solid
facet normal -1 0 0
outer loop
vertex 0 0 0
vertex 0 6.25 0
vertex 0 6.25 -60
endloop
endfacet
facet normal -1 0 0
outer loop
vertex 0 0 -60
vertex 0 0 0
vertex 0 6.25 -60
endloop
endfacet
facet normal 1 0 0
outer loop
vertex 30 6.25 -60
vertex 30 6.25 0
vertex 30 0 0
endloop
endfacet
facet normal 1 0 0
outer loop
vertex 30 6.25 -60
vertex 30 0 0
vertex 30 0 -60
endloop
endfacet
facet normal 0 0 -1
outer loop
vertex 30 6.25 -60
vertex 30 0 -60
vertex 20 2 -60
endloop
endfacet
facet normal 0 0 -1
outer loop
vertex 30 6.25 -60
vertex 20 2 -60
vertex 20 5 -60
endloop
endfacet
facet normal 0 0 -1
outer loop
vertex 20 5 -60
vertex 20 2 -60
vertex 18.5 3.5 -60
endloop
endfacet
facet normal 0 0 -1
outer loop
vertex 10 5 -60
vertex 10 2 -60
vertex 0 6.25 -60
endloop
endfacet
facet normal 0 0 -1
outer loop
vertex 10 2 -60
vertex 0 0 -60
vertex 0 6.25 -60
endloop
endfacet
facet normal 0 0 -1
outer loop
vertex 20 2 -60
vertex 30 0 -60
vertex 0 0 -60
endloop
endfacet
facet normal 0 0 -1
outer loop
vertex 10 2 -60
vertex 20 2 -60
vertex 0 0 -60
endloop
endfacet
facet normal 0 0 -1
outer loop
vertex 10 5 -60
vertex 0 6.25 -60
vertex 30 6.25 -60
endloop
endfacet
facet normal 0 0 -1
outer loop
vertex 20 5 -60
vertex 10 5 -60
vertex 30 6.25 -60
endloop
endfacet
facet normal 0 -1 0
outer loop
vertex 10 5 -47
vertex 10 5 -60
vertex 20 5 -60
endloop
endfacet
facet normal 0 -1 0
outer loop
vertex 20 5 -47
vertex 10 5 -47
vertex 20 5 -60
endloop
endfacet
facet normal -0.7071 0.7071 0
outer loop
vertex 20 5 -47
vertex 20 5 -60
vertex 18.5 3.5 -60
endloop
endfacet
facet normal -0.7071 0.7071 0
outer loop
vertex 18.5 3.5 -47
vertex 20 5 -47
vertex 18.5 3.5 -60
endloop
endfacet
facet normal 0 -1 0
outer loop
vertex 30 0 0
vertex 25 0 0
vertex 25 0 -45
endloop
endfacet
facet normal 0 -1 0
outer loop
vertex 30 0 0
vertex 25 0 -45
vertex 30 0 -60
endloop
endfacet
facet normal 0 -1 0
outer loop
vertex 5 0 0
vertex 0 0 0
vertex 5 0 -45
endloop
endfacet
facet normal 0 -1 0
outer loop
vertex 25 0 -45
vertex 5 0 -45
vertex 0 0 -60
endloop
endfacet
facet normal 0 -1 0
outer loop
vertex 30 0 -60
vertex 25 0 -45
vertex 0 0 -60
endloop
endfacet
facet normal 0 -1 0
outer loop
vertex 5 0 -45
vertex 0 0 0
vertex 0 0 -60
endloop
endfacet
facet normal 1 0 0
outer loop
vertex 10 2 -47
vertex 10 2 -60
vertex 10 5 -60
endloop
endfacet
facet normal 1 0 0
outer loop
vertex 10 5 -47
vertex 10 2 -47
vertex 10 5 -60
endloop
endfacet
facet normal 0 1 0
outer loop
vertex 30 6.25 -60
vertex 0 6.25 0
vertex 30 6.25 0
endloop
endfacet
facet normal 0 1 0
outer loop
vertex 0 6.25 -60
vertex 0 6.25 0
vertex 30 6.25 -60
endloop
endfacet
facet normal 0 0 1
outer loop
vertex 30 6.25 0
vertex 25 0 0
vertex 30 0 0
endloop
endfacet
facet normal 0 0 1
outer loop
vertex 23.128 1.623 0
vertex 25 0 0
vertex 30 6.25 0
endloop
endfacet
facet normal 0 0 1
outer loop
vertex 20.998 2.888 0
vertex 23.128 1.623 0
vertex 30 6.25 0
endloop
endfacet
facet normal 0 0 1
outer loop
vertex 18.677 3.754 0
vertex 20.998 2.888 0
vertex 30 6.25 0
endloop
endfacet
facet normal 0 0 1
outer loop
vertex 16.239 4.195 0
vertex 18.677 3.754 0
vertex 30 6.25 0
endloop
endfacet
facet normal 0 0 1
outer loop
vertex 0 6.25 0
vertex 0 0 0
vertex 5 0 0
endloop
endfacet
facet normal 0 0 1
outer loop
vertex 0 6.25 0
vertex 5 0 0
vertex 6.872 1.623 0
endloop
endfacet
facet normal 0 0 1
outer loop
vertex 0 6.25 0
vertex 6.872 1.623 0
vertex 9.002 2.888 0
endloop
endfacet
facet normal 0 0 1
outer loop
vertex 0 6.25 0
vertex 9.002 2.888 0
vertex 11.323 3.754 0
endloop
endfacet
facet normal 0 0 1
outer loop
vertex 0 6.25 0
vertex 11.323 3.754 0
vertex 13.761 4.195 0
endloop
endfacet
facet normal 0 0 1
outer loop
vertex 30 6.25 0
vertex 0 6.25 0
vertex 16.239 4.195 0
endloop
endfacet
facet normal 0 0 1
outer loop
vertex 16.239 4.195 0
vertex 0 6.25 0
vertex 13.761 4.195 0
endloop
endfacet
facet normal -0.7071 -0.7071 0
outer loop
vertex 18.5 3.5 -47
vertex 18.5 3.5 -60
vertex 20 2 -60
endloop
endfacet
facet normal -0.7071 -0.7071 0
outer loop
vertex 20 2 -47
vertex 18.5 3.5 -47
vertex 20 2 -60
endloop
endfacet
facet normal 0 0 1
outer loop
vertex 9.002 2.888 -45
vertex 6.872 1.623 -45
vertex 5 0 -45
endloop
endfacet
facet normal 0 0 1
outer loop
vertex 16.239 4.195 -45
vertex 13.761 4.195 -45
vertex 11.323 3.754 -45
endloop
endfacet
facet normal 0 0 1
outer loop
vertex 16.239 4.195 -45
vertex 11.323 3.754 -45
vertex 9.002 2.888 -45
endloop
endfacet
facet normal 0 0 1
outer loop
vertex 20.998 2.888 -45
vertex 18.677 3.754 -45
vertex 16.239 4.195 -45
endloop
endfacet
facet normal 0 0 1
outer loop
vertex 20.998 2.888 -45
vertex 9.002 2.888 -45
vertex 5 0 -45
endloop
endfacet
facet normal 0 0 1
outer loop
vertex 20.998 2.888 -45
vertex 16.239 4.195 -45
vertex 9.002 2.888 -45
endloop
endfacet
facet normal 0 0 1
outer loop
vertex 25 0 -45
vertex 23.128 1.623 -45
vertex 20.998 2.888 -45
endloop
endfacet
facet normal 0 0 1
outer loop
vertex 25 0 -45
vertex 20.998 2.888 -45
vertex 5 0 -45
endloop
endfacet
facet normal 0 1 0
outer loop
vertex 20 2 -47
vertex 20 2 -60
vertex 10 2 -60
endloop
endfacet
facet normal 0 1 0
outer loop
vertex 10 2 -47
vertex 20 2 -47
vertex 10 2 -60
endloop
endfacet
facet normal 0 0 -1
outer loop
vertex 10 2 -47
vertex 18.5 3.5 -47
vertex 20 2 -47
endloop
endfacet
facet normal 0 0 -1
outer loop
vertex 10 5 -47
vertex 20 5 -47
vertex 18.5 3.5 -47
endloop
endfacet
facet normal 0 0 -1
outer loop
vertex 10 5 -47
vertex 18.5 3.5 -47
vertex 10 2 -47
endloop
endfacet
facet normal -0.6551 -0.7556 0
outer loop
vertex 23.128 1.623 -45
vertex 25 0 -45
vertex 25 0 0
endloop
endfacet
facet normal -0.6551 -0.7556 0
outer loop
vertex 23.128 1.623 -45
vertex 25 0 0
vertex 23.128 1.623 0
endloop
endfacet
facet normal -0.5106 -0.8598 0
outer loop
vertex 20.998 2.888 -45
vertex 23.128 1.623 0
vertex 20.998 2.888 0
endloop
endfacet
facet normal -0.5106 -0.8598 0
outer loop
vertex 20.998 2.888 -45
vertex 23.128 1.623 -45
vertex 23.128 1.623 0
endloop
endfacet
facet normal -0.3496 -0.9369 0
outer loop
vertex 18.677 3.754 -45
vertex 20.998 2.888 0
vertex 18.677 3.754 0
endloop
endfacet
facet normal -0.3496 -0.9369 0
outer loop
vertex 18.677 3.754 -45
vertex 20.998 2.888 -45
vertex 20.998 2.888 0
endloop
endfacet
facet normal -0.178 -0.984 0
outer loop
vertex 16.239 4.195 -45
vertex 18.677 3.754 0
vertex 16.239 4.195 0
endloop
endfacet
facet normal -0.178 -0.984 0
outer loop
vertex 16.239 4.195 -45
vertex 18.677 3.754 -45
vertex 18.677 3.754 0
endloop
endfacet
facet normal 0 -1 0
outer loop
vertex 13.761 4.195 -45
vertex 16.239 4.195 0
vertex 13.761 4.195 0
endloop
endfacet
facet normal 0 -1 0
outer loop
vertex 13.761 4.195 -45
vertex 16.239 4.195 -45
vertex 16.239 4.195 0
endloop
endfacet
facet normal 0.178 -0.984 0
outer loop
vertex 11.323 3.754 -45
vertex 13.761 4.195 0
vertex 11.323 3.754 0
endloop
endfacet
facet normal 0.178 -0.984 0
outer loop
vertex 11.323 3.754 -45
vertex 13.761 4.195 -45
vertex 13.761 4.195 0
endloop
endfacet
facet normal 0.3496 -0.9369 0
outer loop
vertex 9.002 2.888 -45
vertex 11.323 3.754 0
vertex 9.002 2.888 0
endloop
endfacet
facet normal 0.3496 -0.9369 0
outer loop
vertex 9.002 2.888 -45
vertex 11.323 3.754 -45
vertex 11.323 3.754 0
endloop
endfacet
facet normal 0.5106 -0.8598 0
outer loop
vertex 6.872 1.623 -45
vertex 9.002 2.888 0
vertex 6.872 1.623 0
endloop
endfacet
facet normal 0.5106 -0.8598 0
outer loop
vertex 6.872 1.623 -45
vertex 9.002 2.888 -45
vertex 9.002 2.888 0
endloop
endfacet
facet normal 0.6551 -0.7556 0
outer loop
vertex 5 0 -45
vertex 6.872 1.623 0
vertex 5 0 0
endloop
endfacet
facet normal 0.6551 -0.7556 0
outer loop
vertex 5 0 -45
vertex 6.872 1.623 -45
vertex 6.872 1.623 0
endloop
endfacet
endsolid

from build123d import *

# Parameters (mm, degrees)
SKETCH1_W               = 60
SKETCH1_H               = 6.25
BOSS_EXTRUDE1_DEPTH     = 30
CUT_EXTRUDE1_DEPTH      = 68.372564891
CUT_EXTRUDE1_DEPTH_BACK = 45
CUT_EXTRUDE2_DEPTH      = 13


with BuildPart() as part:
    # Sketch1 → Boss-Extrude1 (new body)
    with BuildSketch(Plane(origin=(0, 0, 0), x_dir=(0, 0, -1), z_dir=(1, 0, 0))):
        with Locations((30, 3.125)):
            Rectangle(SKETCH1_W, SKETCH1_H)
    extrude(amount=BOSS_EXTRUDE1_DEPTH)

    # Sketch2 → Cut-Extrude1 (cut, two sides: drawn at the far end of the back side and taken through both)
    with BuildSketch(Plane.XY.offset(-CUT_EXTRUDE1_DEPTH_BACK)):
        with BuildLine():
            Line((5, 0), (25, 0))
            ThreePointArc((25, 0), (15, 4.25), (5, 0))
        make_face()
    extrude(amount=CUT_EXTRUDE1_DEPTH + CUT_EXTRUDE1_DEPTH_BACK, mode=Mode.SUBTRACT)

    # Sketch3 → Cut-Extrude2 (cut)
    with BuildSketch(Plane(origin=(0, 0, -60), x_dir=(-1, 0, 0), z_dir=(0, 0, -1))):
        Polygon((-10, 2), (-10, 5), (-20, 5), (-18.5, 3.5), (-20, 2), align=None)
    extrude(amount=-CUT_EXTRUDE2_DEPTH, mode=Mode.SUBTRACT)


solid = part.part
